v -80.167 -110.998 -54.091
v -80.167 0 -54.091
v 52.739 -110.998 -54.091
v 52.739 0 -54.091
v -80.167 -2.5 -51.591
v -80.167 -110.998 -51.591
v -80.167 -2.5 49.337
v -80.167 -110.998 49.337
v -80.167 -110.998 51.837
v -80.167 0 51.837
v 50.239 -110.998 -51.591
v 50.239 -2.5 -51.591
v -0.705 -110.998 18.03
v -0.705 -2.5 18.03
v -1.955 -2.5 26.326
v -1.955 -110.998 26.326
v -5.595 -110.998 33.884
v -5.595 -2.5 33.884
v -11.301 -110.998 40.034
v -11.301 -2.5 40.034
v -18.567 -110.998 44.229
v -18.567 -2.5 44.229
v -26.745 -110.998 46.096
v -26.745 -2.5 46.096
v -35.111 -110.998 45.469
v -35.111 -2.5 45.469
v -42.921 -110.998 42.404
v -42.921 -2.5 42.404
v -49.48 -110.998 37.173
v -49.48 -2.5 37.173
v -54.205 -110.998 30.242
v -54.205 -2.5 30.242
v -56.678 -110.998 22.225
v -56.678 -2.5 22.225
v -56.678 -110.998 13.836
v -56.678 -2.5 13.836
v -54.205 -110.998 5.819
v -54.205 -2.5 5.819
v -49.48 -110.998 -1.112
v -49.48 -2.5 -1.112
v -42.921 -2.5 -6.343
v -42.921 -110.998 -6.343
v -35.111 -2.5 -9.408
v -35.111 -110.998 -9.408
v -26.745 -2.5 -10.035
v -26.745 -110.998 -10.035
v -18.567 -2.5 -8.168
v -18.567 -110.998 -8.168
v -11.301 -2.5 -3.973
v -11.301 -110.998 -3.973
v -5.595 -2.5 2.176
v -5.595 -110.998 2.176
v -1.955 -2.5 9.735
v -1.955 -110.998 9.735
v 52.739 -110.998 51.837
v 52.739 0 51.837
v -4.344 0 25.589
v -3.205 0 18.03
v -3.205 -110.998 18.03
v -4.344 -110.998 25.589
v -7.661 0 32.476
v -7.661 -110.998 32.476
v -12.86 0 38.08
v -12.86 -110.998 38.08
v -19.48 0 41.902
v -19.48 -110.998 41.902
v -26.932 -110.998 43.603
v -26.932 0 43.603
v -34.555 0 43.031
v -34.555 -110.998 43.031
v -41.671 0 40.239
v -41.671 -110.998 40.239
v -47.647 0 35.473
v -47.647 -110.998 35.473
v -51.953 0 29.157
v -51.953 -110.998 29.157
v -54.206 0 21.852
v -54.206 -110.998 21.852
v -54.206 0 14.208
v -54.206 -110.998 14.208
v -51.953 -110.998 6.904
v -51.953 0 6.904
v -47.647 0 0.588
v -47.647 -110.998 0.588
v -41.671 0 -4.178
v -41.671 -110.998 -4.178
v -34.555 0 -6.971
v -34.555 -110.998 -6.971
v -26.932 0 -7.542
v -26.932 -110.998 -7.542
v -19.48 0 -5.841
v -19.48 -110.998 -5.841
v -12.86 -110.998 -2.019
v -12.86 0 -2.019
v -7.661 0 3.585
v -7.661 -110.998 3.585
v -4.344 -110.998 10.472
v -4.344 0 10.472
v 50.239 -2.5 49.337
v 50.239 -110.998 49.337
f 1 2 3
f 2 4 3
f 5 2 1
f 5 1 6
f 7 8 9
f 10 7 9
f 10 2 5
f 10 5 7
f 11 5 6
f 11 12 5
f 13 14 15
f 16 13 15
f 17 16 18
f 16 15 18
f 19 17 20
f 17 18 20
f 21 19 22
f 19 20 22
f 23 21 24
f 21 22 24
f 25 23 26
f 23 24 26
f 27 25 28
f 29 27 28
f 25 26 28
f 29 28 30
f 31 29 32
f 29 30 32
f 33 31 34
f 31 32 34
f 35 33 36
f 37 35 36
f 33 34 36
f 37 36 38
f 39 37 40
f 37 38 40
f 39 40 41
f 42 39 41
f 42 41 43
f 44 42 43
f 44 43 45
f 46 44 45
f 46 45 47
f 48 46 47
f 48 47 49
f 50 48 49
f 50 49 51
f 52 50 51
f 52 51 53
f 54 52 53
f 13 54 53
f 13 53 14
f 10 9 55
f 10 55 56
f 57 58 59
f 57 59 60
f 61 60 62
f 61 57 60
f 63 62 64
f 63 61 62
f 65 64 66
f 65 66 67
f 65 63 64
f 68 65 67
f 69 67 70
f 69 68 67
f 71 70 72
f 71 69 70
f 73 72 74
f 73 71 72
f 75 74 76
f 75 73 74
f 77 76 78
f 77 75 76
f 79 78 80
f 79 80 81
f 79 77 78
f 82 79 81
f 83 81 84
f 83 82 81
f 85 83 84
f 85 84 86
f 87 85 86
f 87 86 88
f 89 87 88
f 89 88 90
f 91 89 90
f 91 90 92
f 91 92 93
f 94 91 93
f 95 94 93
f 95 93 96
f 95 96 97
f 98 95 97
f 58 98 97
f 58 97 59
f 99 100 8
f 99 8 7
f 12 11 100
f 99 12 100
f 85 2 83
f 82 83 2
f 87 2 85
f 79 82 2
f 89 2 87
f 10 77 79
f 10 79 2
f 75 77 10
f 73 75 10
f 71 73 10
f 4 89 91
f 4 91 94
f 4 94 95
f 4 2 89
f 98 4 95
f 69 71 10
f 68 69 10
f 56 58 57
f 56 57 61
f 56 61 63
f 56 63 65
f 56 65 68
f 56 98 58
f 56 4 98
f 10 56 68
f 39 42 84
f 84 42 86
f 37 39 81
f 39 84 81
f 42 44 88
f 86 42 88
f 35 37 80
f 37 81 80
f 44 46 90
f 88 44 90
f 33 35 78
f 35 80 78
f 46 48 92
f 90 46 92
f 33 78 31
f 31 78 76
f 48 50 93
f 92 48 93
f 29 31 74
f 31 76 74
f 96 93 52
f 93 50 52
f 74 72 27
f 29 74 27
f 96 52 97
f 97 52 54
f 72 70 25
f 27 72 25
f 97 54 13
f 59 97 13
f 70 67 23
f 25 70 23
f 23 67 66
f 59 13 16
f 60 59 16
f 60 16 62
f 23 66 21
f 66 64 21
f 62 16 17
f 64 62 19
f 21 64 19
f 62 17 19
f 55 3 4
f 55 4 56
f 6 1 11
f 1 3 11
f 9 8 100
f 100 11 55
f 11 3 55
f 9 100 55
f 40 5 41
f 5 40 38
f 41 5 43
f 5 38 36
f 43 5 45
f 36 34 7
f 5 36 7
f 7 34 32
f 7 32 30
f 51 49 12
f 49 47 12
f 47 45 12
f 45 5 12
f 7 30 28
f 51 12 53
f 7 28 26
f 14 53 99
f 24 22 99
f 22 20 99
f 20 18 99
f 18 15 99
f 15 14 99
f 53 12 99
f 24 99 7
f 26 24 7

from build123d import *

# Parameters (mm, degrees)
F0_W     = 107.5063981116
F0_H     = 105.9287339449
F0_R     = 25.6439275176
F1_DEPTH = 25.4
F2_DEPTH = 85.598
F3_DEPTH = 25.4
F4_T     = -2.5


with BuildPart() as f1:
    # F0 (on Front) → F1 (new body)
    with BuildSketch(Plane.XZ):
        with Locations((-1.0142084211, -1.1269003153)):
            Rectangle(F0_W, F0_H)
        with Locations((-28.848676011, 18.0304218084)):
            Circle(F0_R, mode=Mode.SUBTRACT)
    extrude(amount=F1_DEPTH)

    # F2 (add): faces of the model
    f2_faces = [f1.faces().sort_by_distance(p)[0] for p in [
        (5.1544323565, -25.4, -5.372522692),
        (5.1544323565, 0, -5.372522692),
    ]]
    extrude(f2_faces, amount=F2_DEPTH, dir=(0, -1, 0))

    # F3 (add): faces of the model
    f3_faces = [f1.faces().sort_by_distance(p)[0] for p in [
        (-54.7674074769, -55.499, -1.1269003153),
        (52.7389906347, -55.499, -1.1269003153),
    ]]
    extrude(f3_faces, amount=F3_DEPTH, dir=(-1, 0, 0))

    # F4
    f4_openings = [f1.faces().sort_by_distance(p)[0] for p in [
        (-11.111372, -110.998, -4.42159),
        (-80.167407, -55.499, -1.1269),
    ]]
    offset(amount=F4_T, openings=f4_openings)


solid = f1.part
